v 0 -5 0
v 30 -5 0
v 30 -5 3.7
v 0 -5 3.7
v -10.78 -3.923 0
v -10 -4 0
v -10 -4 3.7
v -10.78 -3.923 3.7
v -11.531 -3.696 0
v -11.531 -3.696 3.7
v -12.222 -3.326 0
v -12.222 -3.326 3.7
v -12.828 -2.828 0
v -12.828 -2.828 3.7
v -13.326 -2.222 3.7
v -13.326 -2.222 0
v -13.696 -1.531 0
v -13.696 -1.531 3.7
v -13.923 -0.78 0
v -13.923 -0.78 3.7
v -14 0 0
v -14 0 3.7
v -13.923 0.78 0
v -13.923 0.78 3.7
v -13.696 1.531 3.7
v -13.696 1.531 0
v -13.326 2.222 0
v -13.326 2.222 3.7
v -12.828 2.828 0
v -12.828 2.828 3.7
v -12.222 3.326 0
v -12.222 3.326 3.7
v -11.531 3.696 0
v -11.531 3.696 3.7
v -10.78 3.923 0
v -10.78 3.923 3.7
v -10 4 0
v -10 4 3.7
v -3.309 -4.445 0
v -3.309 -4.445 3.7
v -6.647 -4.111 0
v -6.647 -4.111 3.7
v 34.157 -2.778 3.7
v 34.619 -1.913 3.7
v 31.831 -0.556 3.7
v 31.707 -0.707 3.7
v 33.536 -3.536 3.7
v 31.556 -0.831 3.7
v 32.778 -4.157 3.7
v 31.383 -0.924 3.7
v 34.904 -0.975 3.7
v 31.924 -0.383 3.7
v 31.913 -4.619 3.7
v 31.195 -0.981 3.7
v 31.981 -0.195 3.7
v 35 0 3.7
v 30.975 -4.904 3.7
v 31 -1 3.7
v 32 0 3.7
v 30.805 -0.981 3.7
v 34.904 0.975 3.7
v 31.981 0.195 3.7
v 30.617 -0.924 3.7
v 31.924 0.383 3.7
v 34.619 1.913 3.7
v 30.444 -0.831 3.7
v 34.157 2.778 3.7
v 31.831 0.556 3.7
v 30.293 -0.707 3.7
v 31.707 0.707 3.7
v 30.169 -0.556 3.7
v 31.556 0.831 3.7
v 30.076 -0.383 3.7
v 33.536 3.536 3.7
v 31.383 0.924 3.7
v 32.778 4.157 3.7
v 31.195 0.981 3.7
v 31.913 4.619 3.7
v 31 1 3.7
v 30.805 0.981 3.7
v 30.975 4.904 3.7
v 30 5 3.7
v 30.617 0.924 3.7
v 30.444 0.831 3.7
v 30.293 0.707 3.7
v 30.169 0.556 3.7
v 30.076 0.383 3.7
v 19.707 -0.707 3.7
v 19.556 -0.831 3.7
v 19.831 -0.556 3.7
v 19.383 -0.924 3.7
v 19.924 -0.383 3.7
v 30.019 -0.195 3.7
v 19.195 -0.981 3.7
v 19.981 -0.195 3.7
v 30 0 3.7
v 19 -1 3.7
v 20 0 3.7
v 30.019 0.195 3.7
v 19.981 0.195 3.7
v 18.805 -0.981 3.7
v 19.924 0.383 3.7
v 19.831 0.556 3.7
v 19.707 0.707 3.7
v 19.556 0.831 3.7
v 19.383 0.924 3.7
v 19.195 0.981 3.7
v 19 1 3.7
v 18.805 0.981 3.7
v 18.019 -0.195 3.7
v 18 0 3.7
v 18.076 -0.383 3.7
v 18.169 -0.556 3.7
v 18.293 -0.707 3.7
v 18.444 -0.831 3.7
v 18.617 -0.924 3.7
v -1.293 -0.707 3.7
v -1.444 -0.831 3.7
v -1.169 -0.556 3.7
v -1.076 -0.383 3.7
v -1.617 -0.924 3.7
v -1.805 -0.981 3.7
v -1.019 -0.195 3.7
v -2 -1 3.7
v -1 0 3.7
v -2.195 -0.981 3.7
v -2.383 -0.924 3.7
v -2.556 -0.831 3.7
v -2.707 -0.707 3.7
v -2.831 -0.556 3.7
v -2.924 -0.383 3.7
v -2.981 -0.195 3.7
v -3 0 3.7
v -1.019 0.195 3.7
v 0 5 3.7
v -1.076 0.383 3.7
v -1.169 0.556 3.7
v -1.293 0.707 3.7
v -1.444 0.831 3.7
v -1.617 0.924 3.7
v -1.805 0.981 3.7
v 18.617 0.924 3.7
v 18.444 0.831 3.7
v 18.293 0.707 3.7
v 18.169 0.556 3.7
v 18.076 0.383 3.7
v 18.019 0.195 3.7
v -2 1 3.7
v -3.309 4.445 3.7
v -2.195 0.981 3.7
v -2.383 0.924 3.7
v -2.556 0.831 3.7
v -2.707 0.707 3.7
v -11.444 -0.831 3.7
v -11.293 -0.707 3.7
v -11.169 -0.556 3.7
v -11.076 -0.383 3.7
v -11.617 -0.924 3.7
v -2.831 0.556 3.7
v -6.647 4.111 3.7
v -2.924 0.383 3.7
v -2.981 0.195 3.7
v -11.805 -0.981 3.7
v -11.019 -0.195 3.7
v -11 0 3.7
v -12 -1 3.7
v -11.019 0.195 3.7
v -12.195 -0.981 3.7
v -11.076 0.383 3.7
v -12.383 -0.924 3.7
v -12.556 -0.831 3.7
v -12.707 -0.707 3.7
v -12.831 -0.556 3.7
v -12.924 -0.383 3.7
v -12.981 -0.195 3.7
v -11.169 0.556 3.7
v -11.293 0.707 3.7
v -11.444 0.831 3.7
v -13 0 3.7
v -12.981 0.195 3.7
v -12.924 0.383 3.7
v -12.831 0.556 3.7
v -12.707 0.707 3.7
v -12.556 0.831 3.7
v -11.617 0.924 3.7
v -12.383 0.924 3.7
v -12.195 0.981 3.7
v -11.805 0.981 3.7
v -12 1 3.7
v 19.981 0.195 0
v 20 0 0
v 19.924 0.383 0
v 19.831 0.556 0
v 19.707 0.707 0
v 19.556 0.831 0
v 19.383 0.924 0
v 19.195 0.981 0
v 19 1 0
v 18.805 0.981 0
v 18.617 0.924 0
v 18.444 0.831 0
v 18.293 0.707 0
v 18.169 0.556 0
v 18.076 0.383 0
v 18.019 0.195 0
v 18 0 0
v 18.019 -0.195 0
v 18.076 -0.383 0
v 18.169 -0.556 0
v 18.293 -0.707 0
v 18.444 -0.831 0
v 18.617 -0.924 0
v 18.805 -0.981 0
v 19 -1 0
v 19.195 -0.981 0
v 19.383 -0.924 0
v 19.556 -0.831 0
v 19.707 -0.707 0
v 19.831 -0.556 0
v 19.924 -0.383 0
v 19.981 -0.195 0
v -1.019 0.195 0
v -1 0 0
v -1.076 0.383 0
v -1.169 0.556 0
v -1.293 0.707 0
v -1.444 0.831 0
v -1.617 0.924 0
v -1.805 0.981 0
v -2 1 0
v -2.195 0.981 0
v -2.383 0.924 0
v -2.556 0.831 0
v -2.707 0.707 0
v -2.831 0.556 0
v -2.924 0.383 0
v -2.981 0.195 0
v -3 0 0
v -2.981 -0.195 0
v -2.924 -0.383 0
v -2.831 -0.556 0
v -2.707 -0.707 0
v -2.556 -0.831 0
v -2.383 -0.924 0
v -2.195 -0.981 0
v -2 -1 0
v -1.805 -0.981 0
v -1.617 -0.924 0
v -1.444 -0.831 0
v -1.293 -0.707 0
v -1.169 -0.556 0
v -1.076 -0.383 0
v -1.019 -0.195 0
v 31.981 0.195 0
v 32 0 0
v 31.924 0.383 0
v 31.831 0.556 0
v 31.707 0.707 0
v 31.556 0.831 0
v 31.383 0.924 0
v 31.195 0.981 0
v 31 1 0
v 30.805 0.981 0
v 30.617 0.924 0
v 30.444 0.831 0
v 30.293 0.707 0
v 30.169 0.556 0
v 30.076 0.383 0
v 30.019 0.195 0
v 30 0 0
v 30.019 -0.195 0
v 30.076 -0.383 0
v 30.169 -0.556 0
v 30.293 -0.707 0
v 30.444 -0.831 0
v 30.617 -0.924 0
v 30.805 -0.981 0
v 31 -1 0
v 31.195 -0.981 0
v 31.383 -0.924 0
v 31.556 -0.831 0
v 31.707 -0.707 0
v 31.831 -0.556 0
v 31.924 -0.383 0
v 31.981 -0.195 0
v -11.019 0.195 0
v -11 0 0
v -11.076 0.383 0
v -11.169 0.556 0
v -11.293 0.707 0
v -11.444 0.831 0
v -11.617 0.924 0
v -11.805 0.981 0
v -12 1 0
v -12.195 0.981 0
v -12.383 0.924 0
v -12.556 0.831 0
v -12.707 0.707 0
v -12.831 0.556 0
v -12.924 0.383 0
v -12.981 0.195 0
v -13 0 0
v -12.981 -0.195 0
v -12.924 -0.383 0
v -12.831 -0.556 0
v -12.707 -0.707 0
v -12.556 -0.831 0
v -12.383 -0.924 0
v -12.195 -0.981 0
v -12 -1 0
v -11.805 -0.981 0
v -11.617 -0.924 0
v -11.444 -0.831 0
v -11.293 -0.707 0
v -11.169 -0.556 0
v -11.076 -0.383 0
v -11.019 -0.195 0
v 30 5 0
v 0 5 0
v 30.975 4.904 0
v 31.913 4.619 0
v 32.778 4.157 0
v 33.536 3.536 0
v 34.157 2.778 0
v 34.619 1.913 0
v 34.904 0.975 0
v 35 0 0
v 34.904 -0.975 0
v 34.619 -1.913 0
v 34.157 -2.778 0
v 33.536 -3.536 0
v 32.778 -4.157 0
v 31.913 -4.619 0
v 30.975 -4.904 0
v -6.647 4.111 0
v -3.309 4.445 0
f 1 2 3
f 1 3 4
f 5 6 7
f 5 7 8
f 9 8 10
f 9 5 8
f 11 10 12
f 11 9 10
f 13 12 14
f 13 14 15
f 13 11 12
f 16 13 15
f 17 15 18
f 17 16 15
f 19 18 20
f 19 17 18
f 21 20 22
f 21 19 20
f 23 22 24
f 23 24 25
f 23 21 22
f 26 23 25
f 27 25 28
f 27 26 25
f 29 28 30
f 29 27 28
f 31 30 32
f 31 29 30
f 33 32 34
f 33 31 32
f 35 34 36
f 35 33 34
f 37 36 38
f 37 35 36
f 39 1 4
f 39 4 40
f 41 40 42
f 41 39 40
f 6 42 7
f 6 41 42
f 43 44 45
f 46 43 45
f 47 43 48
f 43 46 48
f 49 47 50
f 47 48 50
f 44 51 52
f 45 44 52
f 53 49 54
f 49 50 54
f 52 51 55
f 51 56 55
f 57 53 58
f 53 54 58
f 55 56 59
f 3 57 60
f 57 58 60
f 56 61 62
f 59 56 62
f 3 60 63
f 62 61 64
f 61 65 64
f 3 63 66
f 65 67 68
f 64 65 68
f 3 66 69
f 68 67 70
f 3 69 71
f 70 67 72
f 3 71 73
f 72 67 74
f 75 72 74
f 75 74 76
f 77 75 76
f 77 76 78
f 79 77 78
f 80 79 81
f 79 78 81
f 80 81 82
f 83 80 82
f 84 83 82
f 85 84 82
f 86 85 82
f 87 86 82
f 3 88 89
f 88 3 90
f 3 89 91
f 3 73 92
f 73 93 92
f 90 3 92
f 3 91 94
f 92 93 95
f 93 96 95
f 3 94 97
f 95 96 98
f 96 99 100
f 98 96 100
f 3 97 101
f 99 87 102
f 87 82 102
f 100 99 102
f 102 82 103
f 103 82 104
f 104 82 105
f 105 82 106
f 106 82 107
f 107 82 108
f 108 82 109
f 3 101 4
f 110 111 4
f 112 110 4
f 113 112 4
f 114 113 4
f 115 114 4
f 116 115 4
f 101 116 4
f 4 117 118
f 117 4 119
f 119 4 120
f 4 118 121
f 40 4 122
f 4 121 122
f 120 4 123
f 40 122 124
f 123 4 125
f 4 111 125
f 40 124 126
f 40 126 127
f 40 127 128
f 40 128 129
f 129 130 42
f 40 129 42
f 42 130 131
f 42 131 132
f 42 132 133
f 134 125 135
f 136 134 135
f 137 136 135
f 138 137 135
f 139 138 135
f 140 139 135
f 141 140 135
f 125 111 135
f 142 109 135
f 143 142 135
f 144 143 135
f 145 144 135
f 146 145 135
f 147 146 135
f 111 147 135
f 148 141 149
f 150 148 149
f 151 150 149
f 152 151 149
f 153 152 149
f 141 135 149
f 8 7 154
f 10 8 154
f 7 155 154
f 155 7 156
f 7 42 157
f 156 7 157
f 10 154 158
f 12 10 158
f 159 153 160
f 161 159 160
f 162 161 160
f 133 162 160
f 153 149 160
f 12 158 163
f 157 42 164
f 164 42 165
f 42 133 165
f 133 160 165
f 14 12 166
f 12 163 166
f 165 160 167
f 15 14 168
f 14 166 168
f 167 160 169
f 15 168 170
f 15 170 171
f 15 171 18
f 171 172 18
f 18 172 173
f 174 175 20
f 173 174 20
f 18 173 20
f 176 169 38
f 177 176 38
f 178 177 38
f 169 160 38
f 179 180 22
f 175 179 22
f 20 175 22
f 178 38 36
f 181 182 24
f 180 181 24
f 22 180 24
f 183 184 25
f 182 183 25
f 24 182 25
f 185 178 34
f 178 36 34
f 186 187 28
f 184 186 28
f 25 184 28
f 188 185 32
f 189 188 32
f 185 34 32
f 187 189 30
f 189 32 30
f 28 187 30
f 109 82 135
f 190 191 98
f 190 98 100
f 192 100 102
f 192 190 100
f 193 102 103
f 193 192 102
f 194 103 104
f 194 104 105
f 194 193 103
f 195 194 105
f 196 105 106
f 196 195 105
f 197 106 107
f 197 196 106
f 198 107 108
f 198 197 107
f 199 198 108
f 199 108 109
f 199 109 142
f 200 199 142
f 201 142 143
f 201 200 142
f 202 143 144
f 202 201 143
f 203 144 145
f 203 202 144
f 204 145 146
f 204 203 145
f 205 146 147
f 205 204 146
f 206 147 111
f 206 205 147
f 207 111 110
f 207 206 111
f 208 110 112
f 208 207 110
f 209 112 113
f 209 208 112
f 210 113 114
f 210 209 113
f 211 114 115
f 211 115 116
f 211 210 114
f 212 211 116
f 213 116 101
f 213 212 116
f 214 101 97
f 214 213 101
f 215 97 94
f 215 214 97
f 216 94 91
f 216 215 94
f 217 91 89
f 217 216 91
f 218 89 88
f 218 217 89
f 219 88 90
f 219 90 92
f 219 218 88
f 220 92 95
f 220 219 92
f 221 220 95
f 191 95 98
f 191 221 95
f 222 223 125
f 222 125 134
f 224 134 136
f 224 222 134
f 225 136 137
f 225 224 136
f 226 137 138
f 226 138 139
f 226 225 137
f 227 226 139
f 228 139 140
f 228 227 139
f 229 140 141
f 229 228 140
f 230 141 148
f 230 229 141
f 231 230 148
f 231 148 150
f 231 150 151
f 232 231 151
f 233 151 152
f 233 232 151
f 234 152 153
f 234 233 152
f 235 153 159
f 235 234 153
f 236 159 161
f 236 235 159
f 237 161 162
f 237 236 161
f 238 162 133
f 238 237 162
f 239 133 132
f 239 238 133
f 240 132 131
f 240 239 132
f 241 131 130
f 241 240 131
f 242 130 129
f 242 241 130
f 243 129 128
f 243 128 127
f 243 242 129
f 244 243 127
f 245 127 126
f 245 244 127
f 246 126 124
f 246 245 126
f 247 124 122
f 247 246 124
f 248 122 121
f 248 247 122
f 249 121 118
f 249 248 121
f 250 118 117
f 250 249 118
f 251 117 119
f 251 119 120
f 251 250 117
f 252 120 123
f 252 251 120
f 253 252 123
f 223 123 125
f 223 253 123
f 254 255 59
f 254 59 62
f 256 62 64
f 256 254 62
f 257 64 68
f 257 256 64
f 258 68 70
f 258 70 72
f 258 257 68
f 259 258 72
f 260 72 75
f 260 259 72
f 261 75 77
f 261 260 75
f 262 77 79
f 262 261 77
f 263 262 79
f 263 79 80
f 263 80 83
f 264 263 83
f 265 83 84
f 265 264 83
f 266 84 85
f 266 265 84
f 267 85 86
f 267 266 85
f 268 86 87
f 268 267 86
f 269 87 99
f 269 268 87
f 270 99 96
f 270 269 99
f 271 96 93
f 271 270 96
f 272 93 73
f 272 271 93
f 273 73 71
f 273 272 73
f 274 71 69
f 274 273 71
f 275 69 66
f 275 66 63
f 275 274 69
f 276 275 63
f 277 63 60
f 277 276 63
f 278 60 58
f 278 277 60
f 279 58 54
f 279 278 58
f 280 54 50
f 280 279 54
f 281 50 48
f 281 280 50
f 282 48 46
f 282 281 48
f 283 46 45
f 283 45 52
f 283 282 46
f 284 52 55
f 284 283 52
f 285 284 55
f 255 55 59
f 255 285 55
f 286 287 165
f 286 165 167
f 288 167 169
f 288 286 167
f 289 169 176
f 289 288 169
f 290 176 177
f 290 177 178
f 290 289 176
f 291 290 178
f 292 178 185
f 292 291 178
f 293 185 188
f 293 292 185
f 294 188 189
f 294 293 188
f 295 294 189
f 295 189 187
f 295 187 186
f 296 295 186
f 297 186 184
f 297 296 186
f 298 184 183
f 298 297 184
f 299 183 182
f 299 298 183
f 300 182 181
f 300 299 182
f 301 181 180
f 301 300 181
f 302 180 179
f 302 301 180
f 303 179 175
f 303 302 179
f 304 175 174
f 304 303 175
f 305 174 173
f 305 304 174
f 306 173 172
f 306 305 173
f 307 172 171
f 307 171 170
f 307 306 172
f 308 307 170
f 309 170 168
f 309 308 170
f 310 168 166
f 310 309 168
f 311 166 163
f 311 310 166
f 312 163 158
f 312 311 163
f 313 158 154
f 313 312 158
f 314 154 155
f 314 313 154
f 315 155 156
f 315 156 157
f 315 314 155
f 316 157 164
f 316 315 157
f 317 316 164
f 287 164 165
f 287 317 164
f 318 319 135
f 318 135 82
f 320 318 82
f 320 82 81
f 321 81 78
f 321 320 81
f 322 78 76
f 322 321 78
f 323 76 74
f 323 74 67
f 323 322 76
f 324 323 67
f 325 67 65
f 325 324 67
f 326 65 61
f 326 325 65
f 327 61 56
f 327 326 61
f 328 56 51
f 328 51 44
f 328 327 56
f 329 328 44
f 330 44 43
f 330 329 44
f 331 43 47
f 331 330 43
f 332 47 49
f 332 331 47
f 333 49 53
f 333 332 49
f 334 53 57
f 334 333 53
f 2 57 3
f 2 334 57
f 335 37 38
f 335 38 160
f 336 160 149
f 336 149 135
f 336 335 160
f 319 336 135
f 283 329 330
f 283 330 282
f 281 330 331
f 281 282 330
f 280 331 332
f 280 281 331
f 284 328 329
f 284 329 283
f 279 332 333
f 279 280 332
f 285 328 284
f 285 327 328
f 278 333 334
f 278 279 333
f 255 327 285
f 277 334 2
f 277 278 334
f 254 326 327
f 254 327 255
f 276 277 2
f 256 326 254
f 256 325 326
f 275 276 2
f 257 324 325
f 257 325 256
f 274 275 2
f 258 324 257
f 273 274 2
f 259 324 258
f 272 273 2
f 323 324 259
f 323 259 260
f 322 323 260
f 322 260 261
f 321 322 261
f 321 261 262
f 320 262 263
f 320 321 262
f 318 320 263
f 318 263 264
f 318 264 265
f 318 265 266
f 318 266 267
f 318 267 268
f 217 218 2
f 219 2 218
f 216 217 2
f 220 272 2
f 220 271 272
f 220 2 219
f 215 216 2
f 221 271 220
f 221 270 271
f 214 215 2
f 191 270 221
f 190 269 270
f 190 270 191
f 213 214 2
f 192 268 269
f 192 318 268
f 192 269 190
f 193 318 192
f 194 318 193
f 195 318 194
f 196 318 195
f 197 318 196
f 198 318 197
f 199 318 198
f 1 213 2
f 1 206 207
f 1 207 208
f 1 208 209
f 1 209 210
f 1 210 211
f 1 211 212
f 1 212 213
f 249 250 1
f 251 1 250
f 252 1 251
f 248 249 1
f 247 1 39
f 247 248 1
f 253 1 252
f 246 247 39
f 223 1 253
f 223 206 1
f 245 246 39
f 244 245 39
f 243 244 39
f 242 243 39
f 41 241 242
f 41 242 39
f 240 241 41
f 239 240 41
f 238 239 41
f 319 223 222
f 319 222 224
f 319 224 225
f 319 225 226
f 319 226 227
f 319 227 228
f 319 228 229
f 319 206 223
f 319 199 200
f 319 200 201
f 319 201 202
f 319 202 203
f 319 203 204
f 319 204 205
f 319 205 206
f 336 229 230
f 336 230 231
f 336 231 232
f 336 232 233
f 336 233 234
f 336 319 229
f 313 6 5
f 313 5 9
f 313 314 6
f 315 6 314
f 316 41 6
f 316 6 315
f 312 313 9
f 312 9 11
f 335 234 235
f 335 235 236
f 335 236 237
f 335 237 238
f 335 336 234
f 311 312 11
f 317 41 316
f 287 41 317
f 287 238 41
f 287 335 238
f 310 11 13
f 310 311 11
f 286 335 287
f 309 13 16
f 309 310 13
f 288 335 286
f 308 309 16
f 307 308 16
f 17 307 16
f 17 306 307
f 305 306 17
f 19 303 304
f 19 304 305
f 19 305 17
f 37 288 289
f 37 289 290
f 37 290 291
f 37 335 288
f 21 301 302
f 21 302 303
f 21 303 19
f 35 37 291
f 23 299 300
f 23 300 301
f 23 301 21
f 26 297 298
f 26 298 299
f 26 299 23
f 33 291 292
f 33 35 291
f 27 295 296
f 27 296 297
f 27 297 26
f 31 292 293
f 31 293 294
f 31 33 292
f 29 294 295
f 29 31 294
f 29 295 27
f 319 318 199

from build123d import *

# Parameters (mm, degrees)
SKETCH1_R           = 1
BOSS_EXTRUDE1_DEPTH = 3.7


with BuildPart() as part:
    # Sketch1 → Boss-Extrude1 (new body)
    with BuildSketch(Plane.XY):
        with BuildLine():
            Line((0, 5), (30, 5))
            ThreePointArc((30, 5), (35, 0), (30, -5))
            Line((30, -5), (0, -5))
            ThreePointArc((0, -5), (-4.975062189, -4.250621894), (-10, -4))
            ThreePointArc((-10, -4), (-14, 0), (-10, 4))
            ThreePointArc((-10, 4), (-4.975062189, 4.250621894), (0, 5))
        make_face()
        with Locations((-12, 0)):
            Circle(SKETCH1_R, mode=Mode.SUBTRACT)
        with Locations((-2, 0)):
            Circle(SKETCH1_R, mode=Mode.SUBTRACT)
        with Locations((19, 0)):
            Circle(SKETCH1_R, mode=Mode.SUBTRACT)
        with Locations((31, 0)):
            Circle(SKETCH1_R, mode=Mode.SUBTRACT)
    extrude(amount=BOSS_EXTRUDE1_DEPTH)


solid = part.part
